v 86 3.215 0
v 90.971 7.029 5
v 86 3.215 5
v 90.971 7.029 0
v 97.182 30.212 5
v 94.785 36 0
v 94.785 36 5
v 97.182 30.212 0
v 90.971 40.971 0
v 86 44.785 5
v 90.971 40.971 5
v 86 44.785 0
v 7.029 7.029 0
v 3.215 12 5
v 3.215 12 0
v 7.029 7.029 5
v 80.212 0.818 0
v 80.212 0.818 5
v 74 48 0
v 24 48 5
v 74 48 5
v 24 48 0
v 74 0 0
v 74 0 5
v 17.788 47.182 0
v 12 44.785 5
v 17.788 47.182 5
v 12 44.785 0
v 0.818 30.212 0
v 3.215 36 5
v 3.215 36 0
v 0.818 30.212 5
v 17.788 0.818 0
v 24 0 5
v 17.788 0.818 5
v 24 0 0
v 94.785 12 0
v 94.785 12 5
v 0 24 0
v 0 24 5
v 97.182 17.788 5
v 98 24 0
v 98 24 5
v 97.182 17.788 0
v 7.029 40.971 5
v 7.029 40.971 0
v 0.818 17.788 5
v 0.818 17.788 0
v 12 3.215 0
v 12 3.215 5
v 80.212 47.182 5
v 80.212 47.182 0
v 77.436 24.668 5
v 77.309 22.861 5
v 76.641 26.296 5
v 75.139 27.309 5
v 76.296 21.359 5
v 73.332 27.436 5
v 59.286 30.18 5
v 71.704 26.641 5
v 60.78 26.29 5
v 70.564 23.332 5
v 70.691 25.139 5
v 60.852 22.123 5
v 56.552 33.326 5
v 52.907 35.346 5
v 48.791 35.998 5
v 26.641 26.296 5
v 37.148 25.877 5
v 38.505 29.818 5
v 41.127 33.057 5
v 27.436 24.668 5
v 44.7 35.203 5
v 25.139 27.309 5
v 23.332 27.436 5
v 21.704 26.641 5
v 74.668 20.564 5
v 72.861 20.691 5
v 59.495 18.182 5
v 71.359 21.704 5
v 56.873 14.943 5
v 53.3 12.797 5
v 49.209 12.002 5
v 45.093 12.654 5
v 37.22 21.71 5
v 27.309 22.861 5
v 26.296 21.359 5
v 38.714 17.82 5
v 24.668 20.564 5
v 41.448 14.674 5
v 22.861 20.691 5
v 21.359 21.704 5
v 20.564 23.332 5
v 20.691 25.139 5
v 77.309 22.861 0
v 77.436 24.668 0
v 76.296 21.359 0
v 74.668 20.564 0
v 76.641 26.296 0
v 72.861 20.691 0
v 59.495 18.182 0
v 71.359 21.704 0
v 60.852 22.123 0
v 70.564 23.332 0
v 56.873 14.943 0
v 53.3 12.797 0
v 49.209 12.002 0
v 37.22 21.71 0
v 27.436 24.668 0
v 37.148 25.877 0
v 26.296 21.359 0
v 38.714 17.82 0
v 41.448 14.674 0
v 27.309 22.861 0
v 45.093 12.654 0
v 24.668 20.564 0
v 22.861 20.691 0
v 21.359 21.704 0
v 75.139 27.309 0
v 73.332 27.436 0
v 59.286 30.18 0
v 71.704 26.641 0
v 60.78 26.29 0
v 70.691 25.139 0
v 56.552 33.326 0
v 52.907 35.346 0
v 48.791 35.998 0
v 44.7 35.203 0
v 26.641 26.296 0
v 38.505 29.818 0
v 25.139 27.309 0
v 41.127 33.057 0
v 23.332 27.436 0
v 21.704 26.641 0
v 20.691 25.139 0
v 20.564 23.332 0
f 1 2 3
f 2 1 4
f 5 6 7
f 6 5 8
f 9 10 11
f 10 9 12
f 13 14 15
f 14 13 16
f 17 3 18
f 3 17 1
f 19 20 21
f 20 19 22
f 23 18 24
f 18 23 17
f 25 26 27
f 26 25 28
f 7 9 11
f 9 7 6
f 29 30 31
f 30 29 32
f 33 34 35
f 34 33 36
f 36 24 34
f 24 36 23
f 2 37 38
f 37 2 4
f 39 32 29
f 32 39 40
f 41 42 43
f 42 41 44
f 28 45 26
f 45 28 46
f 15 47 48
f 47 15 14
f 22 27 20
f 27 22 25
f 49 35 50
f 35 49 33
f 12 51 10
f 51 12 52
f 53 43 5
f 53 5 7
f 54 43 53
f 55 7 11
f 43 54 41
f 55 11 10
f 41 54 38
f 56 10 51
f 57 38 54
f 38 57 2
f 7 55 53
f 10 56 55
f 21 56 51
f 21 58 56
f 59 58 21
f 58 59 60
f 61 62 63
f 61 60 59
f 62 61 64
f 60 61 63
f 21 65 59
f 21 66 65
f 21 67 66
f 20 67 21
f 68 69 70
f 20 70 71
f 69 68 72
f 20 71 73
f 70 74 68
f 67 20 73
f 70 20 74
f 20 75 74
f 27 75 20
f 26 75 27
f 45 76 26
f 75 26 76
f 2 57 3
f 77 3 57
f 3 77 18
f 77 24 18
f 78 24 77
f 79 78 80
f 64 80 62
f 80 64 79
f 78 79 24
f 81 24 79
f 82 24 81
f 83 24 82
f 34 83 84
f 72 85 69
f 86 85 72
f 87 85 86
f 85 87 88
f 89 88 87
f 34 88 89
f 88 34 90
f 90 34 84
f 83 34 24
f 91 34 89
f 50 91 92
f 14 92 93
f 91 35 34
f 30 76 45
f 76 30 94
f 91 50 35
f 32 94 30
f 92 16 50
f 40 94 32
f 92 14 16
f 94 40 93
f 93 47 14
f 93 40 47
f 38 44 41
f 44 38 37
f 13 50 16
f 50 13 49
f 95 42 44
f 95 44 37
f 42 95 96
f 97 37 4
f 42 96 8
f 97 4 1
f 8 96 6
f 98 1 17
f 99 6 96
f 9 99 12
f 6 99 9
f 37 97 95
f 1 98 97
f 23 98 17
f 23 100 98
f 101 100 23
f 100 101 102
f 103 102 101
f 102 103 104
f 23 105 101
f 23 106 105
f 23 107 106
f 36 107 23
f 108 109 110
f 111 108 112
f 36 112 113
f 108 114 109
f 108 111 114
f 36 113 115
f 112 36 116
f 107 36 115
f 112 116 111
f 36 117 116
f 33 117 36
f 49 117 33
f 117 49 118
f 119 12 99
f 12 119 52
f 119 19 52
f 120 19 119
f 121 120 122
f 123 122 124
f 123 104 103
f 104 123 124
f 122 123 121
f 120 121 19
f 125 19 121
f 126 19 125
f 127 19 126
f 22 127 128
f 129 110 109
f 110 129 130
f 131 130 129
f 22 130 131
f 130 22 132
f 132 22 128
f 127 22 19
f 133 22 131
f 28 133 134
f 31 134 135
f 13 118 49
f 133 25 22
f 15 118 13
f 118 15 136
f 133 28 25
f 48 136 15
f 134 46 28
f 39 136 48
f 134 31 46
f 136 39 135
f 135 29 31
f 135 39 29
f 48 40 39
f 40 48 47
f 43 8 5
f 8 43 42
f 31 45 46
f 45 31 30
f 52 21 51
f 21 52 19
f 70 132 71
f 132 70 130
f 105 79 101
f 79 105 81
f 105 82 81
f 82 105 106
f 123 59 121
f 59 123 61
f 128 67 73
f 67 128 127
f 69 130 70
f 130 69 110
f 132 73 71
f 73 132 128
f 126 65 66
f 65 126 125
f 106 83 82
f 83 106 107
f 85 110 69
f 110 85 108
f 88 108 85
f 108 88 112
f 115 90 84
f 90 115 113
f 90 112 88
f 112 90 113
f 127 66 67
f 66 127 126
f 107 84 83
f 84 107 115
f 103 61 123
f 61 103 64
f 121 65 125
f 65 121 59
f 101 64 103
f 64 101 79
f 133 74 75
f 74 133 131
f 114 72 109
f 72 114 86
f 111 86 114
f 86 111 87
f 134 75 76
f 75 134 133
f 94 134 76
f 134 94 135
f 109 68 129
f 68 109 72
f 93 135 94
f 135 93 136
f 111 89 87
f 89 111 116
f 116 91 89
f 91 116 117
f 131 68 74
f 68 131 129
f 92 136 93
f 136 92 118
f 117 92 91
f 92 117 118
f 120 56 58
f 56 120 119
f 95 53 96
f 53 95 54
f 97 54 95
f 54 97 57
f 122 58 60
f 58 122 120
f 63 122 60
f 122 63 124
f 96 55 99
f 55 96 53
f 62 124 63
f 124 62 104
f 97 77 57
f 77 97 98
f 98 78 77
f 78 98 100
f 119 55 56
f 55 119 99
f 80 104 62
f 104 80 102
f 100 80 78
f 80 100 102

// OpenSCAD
$fn = 32;

// ----------------------------------------------------------------------
// Spacer plate: obround span 50, caps R24
// ----------------------------------------------------------------------

// --- parameters (mm) ---
bore_r = 12;              // centre bore radius
bolt_r = 3.5;             // bolt hole radius
plate_t = 5;              // plate thickness, Z (extrusion height)
span = 50;                // obround span
cap_r = 24;               // cap radius
fit_tol = 0.05;           // declared fit tolerance (prompt contract)
free_tol = 0.2;           // declared free tolerance (prompt contract)

profile = [[24, 48], [17.788, 47.182], [12, 44.785], [7.029, 40.971], [3.215, 36], [0.818, 30.212], [0, 24], [0.818, 17.788], [3.215, 12], [7.029, 7.029], [12, 3.215], [17.788, 0.818], [24, 0], [74, 0], [80.212, 0.818], [86, 3.215], [90.971, 7.029], [94.785, 12], [97.182, 17.788], [98, 24], [97.182, 30.212], [94.785, 36], [90.971, 40.971], [86, 44.785], [80.212, 47.182], [74, 48]];  // primary outline, 26 points, counter clockwise
void_1 = [[60.78, 26.29], [59.286, 30.18], [56.552, 33.326], [52.907, 35.346], [48.791, 35.998], [44.7, 35.203], [41.127, 33.057], [38.505, 29.818], [37.148, 25.877], [37.22, 21.71], [38.714, 17.82], [41.448, 14.674], [45.093, 12.654], [49.209, 12.002], [53.3, 12.797], [56.873, 14.943], [59.495, 18.182], [60.852, 22.123]];  // centre bore, 18 points
void_2 = [[27.436, 24.668], [26.641, 26.296], [25.139, 27.309], [23.332, 27.436], [21.704, 26.641], [20.691, 25.139], [20.564, 23.332], [21.359, 21.704], [22.861, 20.691], [24.668, 20.564], [26.296, 21.359], [27.309, 22.861]];  // end hole, 12 points
void_3 = [[77.436, 24.668], [76.641, 26.296], [75.139, 27.309], [73.332, 27.436], [71.704, 26.641], [70.691, 25.139], [70.564, 23.332], [71.359, 21.704], [72.861, 20.691], [74.668, 20.564], [76.296, 21.359], [77.309, 22.861]];  // end hole, 12 points

// --- the one profile operation ---
difference() {
  linear_extrude(height = plate_t) polygon(points = profile);
  translate([0, 0, -1])
    linear_extrude(height = plate_t + 2) polygon(points = void_1);
  translate([0, 0, -1])
    linear_extrude(height = plate_t + 2) polygon(points = void_2);
  translate([0, 0, -1])
    linear_extrude(height = plate_t + 2) polygon(points = void_3);
}
